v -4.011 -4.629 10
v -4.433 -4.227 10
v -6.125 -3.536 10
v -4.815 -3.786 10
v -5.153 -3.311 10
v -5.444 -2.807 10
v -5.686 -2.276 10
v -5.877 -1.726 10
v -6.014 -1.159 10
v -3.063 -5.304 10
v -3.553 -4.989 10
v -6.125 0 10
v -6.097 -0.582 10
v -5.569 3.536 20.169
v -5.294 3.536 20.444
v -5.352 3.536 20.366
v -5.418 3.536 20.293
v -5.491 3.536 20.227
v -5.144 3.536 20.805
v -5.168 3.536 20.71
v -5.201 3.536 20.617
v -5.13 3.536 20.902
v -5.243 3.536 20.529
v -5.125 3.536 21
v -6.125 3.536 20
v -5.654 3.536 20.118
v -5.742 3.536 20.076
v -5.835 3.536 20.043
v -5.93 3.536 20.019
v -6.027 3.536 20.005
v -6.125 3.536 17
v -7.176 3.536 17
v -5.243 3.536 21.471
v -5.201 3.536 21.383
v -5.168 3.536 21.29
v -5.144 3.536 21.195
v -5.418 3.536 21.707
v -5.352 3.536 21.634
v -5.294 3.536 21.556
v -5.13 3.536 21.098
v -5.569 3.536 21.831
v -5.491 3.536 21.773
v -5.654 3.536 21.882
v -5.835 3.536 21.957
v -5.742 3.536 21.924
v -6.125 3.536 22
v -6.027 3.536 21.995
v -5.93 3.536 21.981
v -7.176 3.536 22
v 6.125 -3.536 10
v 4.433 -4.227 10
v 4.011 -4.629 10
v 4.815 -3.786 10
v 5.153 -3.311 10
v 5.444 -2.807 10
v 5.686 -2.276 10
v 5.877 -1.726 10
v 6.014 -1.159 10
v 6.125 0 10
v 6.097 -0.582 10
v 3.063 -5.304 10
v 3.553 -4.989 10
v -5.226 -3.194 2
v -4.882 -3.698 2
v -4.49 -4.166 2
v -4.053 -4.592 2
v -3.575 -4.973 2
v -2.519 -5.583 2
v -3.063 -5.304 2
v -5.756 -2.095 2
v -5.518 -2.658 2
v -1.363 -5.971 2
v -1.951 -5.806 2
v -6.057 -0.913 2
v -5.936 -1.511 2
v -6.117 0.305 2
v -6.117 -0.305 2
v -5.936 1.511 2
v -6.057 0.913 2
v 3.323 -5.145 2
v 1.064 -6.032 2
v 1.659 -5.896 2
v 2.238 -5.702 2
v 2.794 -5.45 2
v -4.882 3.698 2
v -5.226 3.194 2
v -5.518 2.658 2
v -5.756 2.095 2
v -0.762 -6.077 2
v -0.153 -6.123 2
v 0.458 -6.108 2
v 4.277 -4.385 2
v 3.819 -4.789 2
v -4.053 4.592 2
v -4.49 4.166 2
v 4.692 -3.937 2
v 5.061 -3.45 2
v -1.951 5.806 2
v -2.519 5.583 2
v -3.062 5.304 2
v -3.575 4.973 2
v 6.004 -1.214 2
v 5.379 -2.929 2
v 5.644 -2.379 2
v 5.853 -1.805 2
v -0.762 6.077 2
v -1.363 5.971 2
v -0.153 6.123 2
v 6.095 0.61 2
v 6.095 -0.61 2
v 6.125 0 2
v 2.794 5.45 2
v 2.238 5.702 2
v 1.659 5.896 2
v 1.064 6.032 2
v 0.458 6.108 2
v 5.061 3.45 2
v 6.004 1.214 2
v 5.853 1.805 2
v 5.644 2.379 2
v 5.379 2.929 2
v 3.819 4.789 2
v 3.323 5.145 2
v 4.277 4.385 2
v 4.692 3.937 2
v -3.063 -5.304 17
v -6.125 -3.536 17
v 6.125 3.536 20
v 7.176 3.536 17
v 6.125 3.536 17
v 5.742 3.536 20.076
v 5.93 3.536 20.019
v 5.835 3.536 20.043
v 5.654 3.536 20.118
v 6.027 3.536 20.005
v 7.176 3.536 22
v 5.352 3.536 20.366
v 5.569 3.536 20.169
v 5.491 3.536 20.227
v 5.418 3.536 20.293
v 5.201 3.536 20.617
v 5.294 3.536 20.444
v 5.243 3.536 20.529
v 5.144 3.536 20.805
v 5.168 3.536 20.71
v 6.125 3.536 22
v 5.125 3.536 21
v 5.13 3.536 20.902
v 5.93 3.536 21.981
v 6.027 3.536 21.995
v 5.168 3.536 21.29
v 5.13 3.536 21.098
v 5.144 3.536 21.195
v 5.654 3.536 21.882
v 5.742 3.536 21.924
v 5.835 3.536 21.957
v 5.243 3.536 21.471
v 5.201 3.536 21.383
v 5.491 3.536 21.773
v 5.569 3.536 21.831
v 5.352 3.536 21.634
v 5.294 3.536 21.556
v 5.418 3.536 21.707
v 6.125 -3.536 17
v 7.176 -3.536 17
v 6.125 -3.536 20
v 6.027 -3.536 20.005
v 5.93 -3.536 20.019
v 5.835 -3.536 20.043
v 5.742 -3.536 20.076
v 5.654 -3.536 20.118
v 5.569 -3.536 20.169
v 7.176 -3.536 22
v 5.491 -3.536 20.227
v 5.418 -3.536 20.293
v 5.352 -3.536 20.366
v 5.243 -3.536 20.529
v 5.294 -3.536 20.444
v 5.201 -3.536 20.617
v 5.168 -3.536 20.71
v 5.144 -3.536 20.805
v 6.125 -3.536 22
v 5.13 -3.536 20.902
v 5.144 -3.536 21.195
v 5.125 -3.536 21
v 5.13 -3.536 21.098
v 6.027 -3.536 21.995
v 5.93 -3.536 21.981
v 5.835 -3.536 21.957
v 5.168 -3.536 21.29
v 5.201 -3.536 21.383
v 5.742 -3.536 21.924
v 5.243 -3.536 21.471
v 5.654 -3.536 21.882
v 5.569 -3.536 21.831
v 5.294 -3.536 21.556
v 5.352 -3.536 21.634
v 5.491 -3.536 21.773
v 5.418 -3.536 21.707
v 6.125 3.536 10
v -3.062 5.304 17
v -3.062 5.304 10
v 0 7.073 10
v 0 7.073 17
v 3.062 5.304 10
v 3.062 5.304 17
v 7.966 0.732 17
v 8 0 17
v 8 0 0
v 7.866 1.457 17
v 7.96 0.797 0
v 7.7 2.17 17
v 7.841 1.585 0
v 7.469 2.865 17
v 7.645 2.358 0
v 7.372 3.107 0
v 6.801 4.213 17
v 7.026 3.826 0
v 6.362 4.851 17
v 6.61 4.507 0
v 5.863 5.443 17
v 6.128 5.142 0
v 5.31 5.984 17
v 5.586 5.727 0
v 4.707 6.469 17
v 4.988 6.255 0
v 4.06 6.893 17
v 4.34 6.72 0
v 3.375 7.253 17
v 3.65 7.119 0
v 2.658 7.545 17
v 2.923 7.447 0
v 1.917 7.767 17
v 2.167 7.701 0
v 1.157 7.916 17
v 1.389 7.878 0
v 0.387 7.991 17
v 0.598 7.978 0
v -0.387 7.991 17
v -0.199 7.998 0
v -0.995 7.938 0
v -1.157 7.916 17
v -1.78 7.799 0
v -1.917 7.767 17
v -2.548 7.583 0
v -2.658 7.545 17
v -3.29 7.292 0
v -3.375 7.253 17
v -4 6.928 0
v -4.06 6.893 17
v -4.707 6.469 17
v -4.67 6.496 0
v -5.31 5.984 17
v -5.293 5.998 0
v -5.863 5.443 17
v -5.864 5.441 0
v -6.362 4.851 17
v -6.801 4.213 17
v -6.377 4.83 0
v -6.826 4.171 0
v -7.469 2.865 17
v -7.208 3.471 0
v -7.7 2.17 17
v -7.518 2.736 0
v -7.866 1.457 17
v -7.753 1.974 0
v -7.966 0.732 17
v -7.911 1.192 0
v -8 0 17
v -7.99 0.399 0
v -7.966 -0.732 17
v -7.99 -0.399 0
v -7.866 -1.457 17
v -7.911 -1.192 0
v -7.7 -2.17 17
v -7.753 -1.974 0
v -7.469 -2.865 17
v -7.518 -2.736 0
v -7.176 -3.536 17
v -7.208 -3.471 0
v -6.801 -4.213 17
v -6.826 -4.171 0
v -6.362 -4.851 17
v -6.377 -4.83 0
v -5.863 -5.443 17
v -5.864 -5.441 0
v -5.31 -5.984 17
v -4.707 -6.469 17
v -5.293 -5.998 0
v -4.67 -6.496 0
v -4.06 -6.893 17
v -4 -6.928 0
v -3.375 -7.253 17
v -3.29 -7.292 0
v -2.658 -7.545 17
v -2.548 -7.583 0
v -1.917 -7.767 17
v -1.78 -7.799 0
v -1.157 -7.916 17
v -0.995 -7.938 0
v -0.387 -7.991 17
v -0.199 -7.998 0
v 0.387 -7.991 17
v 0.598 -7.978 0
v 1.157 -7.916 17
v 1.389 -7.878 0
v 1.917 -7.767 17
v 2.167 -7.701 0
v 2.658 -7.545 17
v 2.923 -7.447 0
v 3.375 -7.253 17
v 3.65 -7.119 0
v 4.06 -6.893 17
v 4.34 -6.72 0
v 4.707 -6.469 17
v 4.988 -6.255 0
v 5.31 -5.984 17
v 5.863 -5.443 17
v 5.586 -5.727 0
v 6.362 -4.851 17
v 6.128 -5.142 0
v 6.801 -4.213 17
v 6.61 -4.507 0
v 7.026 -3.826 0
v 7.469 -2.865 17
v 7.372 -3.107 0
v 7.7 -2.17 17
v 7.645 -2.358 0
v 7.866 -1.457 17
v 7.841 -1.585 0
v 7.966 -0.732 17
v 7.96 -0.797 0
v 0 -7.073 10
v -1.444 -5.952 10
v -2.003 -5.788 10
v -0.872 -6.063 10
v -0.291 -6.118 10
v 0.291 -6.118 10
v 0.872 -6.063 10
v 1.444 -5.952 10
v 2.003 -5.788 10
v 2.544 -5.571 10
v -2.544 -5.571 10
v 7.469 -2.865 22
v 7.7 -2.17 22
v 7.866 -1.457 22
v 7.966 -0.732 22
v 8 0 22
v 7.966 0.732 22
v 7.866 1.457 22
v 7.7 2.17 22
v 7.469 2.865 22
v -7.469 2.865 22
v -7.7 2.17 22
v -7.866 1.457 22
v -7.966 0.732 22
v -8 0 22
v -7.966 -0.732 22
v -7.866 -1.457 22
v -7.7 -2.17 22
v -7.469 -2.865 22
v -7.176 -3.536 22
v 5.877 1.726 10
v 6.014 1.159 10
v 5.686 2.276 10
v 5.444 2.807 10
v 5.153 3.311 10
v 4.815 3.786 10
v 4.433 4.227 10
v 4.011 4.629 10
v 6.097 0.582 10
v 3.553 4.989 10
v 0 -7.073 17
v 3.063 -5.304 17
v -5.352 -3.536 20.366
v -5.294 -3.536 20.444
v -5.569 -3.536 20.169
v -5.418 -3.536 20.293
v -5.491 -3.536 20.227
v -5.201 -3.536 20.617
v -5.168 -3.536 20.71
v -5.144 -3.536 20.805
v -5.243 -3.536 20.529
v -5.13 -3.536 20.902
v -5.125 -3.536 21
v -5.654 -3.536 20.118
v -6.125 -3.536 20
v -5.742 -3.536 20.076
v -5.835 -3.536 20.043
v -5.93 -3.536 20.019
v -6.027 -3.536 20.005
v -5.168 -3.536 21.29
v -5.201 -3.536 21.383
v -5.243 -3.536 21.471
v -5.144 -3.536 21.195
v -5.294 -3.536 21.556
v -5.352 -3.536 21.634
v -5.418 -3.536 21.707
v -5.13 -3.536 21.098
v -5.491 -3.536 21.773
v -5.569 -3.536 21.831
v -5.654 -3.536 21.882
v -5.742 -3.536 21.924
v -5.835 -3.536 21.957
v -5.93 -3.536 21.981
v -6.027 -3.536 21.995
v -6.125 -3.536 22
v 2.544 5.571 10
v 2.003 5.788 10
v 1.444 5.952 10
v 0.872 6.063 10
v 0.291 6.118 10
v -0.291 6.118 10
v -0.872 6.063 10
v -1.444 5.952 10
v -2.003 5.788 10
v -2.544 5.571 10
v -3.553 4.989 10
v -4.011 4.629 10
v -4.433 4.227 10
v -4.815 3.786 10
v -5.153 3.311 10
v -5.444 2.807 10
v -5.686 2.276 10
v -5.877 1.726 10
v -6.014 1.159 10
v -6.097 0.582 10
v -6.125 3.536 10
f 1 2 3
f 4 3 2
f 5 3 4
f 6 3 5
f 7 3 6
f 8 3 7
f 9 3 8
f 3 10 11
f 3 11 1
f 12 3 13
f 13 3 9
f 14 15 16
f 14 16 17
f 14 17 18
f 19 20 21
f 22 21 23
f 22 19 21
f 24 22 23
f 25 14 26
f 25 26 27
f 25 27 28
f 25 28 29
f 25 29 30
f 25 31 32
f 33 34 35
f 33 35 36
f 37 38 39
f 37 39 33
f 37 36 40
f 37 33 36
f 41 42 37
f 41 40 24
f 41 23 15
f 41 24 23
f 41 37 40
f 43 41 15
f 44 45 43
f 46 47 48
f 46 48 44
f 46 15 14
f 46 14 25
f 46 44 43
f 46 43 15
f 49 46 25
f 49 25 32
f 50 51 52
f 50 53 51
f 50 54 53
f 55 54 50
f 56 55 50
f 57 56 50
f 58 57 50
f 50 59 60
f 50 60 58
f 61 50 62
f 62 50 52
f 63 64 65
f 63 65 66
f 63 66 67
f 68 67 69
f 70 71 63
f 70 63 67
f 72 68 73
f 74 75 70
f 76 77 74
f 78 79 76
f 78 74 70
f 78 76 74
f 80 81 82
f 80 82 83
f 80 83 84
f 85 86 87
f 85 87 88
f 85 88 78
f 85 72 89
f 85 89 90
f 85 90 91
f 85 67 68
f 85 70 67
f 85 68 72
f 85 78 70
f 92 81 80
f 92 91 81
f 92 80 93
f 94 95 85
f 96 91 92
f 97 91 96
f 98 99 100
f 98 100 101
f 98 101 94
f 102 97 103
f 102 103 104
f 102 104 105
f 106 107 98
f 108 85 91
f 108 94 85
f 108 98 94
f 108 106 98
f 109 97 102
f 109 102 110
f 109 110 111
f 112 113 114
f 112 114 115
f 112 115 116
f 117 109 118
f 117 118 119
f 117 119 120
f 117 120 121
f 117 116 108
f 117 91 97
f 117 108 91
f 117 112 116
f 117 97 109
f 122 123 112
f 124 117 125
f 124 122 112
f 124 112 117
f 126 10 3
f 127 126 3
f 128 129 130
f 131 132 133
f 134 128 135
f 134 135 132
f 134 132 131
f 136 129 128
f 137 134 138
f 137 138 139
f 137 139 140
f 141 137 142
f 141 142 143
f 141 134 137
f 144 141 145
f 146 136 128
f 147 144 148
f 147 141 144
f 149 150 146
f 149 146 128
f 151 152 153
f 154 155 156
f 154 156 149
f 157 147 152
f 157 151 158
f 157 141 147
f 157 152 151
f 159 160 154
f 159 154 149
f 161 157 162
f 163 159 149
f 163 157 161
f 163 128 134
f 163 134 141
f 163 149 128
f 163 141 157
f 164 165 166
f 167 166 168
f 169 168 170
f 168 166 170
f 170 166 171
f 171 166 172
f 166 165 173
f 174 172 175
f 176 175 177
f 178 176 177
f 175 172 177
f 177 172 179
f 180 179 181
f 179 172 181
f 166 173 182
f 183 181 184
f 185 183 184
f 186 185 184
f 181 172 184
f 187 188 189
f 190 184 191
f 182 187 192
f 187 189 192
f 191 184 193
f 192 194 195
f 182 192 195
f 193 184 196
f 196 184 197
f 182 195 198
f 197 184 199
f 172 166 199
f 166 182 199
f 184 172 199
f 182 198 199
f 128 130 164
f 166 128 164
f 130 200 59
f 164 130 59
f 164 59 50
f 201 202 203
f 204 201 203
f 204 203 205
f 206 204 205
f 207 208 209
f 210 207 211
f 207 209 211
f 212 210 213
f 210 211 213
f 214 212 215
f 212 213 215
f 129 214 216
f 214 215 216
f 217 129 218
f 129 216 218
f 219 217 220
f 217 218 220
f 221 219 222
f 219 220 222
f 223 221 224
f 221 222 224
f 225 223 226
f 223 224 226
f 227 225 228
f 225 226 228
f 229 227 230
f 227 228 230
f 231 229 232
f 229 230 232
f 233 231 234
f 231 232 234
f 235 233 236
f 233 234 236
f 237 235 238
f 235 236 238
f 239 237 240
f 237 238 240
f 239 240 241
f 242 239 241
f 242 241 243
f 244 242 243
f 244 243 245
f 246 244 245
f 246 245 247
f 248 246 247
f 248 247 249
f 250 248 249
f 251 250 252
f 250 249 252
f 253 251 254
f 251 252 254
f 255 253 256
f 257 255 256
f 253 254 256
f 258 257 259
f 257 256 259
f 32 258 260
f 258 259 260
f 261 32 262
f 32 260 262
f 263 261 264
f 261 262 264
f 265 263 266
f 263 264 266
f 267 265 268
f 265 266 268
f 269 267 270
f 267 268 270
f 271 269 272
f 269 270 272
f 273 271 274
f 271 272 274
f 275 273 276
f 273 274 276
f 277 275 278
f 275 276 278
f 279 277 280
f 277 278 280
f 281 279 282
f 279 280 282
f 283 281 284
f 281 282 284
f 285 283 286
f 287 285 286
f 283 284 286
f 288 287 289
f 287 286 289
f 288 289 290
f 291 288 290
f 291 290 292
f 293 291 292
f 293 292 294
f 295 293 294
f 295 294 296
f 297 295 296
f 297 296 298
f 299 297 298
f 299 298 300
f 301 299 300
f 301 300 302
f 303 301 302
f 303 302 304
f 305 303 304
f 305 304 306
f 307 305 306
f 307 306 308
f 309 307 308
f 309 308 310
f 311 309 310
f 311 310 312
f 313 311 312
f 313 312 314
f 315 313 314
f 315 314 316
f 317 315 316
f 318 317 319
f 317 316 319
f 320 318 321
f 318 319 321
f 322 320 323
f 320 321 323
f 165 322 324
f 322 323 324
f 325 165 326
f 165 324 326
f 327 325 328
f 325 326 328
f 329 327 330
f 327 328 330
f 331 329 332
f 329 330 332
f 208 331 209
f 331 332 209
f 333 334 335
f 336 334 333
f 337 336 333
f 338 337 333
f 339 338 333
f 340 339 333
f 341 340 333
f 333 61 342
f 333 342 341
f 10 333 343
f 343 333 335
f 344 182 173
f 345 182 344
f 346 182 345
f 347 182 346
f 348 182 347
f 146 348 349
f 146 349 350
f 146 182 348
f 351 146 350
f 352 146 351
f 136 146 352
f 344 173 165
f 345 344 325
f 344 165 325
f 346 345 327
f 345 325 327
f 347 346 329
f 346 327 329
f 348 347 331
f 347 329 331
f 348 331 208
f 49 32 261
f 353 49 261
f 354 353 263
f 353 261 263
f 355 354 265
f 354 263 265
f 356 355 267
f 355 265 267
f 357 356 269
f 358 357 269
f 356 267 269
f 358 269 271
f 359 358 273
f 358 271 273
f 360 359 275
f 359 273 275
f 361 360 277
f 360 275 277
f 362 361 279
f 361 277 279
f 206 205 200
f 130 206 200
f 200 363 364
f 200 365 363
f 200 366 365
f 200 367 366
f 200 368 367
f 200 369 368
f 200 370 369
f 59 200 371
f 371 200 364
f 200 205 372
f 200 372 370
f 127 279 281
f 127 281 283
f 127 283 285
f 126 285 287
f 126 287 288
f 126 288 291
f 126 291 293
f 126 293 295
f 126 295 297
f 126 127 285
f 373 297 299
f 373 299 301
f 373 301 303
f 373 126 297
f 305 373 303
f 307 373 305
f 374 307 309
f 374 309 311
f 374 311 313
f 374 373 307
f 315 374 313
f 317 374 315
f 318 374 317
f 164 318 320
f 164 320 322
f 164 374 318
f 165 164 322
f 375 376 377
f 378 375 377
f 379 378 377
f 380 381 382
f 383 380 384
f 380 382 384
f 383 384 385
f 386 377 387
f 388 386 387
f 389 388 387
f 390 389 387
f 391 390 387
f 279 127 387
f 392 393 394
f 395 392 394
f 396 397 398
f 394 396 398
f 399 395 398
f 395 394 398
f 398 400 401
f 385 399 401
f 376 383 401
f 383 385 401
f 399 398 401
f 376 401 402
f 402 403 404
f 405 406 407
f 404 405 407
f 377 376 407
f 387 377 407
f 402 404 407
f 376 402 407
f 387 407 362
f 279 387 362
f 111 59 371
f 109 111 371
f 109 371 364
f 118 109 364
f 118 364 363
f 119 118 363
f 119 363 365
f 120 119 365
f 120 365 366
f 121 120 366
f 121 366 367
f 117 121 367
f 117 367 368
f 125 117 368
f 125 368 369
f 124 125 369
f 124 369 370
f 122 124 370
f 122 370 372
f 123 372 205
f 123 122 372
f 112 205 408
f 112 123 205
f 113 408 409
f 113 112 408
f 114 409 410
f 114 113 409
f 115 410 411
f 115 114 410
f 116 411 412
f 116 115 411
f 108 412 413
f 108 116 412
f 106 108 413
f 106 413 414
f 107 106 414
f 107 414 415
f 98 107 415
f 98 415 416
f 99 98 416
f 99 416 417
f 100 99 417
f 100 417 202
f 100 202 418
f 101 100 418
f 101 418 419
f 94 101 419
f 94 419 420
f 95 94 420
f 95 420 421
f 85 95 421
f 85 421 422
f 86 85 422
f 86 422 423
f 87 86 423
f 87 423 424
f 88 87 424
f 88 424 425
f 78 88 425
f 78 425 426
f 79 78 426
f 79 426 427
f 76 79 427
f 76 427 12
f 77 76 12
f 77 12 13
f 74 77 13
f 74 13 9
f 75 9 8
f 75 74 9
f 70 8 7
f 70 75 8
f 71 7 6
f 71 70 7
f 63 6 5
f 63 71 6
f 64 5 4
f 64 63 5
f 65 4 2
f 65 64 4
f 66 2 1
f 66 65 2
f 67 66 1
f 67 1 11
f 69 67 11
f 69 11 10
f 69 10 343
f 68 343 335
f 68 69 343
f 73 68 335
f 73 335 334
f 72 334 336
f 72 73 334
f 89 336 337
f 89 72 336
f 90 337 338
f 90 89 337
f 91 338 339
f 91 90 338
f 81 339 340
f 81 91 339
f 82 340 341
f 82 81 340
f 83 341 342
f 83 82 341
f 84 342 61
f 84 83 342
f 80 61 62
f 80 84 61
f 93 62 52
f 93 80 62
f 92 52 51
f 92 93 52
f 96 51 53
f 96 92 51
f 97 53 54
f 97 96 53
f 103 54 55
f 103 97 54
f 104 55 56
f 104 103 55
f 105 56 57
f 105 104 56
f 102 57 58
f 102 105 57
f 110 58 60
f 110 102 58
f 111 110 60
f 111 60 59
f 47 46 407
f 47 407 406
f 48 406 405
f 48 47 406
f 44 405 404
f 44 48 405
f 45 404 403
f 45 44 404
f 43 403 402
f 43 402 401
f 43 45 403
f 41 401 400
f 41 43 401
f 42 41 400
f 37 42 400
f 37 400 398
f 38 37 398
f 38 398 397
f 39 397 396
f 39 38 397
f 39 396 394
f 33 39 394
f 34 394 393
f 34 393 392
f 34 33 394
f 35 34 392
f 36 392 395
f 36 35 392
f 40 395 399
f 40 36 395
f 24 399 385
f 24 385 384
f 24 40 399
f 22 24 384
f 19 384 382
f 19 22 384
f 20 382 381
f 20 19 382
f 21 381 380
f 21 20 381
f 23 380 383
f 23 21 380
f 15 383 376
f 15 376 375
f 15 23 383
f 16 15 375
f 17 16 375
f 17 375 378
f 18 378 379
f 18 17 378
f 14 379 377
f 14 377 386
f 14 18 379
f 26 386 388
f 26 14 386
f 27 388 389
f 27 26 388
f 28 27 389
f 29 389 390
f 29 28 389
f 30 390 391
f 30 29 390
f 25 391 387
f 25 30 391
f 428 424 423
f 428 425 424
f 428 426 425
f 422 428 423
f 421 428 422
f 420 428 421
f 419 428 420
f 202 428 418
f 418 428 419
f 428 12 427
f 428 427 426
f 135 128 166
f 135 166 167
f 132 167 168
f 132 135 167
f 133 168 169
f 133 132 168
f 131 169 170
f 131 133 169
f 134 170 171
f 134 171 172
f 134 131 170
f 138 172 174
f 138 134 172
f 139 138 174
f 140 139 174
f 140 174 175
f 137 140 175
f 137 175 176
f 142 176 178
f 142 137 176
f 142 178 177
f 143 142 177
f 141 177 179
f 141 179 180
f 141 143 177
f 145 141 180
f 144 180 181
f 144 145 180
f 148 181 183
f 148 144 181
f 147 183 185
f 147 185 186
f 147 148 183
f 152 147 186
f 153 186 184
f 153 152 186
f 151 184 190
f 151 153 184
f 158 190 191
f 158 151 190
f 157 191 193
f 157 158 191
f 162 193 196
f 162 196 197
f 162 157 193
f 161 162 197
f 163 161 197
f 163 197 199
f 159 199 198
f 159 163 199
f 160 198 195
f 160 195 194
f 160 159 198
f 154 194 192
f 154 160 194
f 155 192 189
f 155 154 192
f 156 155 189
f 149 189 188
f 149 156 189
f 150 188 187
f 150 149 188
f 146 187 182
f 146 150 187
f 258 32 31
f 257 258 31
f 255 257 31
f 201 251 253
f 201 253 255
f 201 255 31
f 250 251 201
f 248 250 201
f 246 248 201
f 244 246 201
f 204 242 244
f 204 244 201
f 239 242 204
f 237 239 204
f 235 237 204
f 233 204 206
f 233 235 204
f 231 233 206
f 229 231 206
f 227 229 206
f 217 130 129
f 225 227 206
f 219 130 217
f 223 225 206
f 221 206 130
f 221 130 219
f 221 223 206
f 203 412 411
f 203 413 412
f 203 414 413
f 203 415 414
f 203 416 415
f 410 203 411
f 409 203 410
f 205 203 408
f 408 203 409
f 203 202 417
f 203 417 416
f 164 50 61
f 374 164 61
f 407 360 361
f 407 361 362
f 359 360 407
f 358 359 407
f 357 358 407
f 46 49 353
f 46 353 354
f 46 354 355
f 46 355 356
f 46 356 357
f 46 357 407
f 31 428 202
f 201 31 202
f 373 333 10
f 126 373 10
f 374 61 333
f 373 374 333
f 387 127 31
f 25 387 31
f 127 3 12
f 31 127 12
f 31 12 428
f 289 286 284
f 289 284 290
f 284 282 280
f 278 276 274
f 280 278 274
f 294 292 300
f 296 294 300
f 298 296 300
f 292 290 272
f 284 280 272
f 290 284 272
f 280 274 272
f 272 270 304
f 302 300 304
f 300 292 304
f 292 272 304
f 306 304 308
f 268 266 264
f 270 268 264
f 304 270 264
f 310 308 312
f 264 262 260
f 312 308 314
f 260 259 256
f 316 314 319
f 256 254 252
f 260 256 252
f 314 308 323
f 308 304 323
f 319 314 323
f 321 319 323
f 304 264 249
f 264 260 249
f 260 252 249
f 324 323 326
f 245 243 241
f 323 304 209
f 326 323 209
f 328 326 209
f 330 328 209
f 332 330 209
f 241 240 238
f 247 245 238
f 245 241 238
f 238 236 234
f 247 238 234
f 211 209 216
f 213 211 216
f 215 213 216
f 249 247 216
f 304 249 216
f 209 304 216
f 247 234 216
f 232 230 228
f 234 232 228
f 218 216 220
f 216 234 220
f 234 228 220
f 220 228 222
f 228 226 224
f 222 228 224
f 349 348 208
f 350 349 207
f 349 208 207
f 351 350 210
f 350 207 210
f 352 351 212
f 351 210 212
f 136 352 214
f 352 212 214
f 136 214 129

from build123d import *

# Parameters (mm, degrees)
F0_R      = 6.125
F1_DEPTH  = 2
F0_R_2    = 8
F2_DEPTH  = 10
F3_R      = 8
F4_DEPTH  = 7
F6_DEPTH  = 5
F8_DEPTH  = 7.0725407976
F10_DEPTH = 7.0725407976


with BuildPart() as f1:
    # F0 (on Top) → F1 (new body)
    with BuildSketch(Plane.XY):
        Circle(F0_R)
    extrude(amount=F1_DEPTH)

    # F0 (on Top) → F2 (join)
    with BuildSketch(Plane.XY):
        Circle(F0_R_2)
        Circle(F0_R, mode=Mode.SUBTRACT)
    extrude(amount=F2_DEPTH)

    # F3 (on face) → F4 (join)
    with BuildSketch(Plane.XY.offset(10)):
        Circle(F3_R)
        Polygon((3.0624998551, 5.3044056818), (6.125, 3.5362703988), (6.125, 0), (6.125, -3.5362703988), (3.0625000444, -5.3044055725), (0, -7.0725407976), (-3.0625000444, -5.3044055725), (-6.125, -3.5362703988), (-6.125, 0), (-6.125, 3.5362703988), (-3.0624999859, 5.3044056063), (0, 7.0725407976), align=None, mode=Mode.SUBTRACT)
    extrude(amount=F4_DEPTH)

    # F5 (on face) → F6 (join)
    with BuildSketch(Plane.XY.offset(17)):
        with BuildLine():
            Line((-6.125, -3.5362703988), (-6.125, 3.5362703988))
            Line((-6.125, 3.5362703988), (-7.1759871563, 3.5362703988))
            ThreePointArc((-7.1759871563, 3.5362703988), (-8, 0), (-7.1759871563, -3.5362703988))
            Line((-7.1759871563, -3.5362703988), (-6.125, -3.5362703988))
        make_face()
        with BuildLine():
            ThreePointArc((8, 0), (7.7912738769, 1.8155030639), (7.1759871563, 3.5362703988))
            Line((7.1759871563, 3.5362703988), (6.125, 3.5362703988))
            Line((6.125, 3.5362703988), (6.125, -3.5362703988))
            Line((6.125, -3.5362703988), (7.1759871563, -3.5362703988))
            ThreePointArc((7.1759871563, -3.5362703988), (7.7912738769, -1.8155030639), (8, 0))
        make_face()
    extrude(amount=F6_DEPTH)

    # F7 (on face) → F8 (join, through all)
    with BuildSketch(Plane(origin=(0, 3.5362703988, 0), x_dir=(-1, 0, 0), z_dir=(0, 1, 0))):
        with BuildLine():
            Line((6.125, 20), (6.125, 22))
            ThreePointArc((6.125, 22), (5.125, 21), (6.125, 20))
        make_face()
    extrude(amount=-F8_DEPTH)

    # F9 (on face) → F10 (join, through all)
    with BuildSketch(Plane(origin=(0, 3.5362703988, 0), x_dir=(-1, 0, 0), z_dir=(0, 1, 0))):
        with BuildLine():
            Line((-6.125, 22), (-6.125, 20))
            ThreePointArc((-6.125, 20), (-5.125, 21), (-6.125, 22))
        make_face()
    extrude(amount=-F10_DEPTH)


solid = f1.part
